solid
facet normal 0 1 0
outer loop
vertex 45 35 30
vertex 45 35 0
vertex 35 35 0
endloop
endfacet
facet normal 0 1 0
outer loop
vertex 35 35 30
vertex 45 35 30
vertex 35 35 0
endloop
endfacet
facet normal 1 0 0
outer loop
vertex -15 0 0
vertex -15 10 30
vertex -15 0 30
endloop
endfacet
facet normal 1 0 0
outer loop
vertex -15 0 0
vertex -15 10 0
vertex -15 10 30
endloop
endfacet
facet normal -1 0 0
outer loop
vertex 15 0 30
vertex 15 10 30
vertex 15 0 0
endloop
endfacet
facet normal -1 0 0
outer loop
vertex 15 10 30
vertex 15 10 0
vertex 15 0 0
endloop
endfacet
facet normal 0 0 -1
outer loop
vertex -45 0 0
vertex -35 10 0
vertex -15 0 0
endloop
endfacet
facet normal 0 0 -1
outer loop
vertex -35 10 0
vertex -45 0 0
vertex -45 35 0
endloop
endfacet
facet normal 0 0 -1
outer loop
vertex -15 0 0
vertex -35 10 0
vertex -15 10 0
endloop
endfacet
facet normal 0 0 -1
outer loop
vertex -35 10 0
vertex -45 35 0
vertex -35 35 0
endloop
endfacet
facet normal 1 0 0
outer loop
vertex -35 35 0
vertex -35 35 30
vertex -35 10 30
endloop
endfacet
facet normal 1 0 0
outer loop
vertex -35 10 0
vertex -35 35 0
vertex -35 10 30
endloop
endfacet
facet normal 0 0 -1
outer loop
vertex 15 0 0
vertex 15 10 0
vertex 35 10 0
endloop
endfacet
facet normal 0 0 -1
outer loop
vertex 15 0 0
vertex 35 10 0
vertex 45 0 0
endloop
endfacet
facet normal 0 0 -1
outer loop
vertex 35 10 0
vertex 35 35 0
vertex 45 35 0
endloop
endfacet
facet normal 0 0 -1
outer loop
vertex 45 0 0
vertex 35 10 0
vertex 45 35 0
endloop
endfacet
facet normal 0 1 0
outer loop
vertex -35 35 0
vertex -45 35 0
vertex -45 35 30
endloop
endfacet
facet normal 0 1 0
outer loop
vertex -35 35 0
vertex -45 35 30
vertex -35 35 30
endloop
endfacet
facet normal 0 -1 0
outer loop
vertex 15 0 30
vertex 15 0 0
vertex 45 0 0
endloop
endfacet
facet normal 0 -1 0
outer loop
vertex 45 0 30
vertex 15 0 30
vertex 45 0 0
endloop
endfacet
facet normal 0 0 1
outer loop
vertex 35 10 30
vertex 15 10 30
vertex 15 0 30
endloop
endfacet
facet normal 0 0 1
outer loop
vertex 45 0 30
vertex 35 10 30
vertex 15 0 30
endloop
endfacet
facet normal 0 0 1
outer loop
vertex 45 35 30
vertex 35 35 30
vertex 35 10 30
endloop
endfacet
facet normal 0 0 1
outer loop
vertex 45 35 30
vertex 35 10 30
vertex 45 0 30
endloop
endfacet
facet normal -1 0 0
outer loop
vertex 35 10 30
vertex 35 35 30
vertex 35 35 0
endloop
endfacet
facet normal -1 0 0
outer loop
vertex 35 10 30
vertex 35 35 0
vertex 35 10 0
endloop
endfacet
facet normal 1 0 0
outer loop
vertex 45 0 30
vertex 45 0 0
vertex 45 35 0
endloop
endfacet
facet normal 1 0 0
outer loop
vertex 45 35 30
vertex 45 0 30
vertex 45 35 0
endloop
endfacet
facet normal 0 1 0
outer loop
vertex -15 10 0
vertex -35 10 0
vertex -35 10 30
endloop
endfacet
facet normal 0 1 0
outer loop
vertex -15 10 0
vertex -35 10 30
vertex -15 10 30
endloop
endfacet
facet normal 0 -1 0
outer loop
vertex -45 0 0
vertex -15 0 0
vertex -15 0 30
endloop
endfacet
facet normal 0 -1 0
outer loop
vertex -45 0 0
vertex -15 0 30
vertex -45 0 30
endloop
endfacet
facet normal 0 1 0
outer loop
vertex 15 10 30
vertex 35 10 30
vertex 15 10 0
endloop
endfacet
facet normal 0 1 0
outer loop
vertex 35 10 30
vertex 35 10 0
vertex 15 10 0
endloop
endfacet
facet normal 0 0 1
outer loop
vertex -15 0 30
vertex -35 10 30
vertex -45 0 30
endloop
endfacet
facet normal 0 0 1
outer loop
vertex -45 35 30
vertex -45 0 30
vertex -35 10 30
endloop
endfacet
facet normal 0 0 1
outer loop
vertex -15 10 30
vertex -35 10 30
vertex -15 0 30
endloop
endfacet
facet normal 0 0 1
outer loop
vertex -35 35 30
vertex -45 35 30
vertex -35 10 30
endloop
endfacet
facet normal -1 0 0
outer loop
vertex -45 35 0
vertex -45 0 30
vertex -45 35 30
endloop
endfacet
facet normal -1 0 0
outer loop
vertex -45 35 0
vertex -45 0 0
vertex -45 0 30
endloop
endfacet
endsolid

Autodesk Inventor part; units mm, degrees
ref_plane "YZ Plane" through (0, 0, 0) normal (1, 0, 0) x (0, 1, 0)
ref_plane "XZ Plane" through (0, 0, 0) normal (0, 1, 0) x (-1, 0, 0)
ref_plane "XY Plane" through (0, 0, 0) normal (0, 0, 1) x (1, 0, 0)
sketch "Sketch2" plane through (0, 0, 0) normal (0, 0, 1) x (1, 0, 0)
  line L0 (15, 0) -> (35, 0)
  line L1 (35, 0) -> (35, 10)
  line L2 (35, 10) -> (15, 10)
  line L3 (15, 10) -> (15, 0)
  line L4 (35, 0) -> (45, 0)
  line L5 (45, 0) -> (45, 35)
  line L6 (45, 35) -> (35, 35)
  line L7 (35, 35) -> (35, 0)
  line L8 (0, 0) -> (0, 15.6723)
  line L9 (-15, 0) -> (-35, 0)
  line L10 (-35, 0) -> (-35, 10)
  line L11 (-35, 10) -> (-15, 10)
  line L12 (-15, 10) -> (-15, 0)
  line L13 (-35, 0) -> (-45, 0)
  line L14 (-45, 0) -> (-45, 35)
  line L15 (-45, 35) -> (-35, 35)
  line L16 (-35, 35) -> (-35, 0)
  point P0 (35, 10)
  point P1 (-35, 10)
  dimension "d15" = 15
  dimension "d16" = 10
  dimension "d17" = 20
  dimension "d18" = 10
  dimension "d19" = 35
  dimension "d20" = 35
extrude "Extrusion2" add sketch "Sketch2" along normal blind 30
properties part number "Guide_Basic"
